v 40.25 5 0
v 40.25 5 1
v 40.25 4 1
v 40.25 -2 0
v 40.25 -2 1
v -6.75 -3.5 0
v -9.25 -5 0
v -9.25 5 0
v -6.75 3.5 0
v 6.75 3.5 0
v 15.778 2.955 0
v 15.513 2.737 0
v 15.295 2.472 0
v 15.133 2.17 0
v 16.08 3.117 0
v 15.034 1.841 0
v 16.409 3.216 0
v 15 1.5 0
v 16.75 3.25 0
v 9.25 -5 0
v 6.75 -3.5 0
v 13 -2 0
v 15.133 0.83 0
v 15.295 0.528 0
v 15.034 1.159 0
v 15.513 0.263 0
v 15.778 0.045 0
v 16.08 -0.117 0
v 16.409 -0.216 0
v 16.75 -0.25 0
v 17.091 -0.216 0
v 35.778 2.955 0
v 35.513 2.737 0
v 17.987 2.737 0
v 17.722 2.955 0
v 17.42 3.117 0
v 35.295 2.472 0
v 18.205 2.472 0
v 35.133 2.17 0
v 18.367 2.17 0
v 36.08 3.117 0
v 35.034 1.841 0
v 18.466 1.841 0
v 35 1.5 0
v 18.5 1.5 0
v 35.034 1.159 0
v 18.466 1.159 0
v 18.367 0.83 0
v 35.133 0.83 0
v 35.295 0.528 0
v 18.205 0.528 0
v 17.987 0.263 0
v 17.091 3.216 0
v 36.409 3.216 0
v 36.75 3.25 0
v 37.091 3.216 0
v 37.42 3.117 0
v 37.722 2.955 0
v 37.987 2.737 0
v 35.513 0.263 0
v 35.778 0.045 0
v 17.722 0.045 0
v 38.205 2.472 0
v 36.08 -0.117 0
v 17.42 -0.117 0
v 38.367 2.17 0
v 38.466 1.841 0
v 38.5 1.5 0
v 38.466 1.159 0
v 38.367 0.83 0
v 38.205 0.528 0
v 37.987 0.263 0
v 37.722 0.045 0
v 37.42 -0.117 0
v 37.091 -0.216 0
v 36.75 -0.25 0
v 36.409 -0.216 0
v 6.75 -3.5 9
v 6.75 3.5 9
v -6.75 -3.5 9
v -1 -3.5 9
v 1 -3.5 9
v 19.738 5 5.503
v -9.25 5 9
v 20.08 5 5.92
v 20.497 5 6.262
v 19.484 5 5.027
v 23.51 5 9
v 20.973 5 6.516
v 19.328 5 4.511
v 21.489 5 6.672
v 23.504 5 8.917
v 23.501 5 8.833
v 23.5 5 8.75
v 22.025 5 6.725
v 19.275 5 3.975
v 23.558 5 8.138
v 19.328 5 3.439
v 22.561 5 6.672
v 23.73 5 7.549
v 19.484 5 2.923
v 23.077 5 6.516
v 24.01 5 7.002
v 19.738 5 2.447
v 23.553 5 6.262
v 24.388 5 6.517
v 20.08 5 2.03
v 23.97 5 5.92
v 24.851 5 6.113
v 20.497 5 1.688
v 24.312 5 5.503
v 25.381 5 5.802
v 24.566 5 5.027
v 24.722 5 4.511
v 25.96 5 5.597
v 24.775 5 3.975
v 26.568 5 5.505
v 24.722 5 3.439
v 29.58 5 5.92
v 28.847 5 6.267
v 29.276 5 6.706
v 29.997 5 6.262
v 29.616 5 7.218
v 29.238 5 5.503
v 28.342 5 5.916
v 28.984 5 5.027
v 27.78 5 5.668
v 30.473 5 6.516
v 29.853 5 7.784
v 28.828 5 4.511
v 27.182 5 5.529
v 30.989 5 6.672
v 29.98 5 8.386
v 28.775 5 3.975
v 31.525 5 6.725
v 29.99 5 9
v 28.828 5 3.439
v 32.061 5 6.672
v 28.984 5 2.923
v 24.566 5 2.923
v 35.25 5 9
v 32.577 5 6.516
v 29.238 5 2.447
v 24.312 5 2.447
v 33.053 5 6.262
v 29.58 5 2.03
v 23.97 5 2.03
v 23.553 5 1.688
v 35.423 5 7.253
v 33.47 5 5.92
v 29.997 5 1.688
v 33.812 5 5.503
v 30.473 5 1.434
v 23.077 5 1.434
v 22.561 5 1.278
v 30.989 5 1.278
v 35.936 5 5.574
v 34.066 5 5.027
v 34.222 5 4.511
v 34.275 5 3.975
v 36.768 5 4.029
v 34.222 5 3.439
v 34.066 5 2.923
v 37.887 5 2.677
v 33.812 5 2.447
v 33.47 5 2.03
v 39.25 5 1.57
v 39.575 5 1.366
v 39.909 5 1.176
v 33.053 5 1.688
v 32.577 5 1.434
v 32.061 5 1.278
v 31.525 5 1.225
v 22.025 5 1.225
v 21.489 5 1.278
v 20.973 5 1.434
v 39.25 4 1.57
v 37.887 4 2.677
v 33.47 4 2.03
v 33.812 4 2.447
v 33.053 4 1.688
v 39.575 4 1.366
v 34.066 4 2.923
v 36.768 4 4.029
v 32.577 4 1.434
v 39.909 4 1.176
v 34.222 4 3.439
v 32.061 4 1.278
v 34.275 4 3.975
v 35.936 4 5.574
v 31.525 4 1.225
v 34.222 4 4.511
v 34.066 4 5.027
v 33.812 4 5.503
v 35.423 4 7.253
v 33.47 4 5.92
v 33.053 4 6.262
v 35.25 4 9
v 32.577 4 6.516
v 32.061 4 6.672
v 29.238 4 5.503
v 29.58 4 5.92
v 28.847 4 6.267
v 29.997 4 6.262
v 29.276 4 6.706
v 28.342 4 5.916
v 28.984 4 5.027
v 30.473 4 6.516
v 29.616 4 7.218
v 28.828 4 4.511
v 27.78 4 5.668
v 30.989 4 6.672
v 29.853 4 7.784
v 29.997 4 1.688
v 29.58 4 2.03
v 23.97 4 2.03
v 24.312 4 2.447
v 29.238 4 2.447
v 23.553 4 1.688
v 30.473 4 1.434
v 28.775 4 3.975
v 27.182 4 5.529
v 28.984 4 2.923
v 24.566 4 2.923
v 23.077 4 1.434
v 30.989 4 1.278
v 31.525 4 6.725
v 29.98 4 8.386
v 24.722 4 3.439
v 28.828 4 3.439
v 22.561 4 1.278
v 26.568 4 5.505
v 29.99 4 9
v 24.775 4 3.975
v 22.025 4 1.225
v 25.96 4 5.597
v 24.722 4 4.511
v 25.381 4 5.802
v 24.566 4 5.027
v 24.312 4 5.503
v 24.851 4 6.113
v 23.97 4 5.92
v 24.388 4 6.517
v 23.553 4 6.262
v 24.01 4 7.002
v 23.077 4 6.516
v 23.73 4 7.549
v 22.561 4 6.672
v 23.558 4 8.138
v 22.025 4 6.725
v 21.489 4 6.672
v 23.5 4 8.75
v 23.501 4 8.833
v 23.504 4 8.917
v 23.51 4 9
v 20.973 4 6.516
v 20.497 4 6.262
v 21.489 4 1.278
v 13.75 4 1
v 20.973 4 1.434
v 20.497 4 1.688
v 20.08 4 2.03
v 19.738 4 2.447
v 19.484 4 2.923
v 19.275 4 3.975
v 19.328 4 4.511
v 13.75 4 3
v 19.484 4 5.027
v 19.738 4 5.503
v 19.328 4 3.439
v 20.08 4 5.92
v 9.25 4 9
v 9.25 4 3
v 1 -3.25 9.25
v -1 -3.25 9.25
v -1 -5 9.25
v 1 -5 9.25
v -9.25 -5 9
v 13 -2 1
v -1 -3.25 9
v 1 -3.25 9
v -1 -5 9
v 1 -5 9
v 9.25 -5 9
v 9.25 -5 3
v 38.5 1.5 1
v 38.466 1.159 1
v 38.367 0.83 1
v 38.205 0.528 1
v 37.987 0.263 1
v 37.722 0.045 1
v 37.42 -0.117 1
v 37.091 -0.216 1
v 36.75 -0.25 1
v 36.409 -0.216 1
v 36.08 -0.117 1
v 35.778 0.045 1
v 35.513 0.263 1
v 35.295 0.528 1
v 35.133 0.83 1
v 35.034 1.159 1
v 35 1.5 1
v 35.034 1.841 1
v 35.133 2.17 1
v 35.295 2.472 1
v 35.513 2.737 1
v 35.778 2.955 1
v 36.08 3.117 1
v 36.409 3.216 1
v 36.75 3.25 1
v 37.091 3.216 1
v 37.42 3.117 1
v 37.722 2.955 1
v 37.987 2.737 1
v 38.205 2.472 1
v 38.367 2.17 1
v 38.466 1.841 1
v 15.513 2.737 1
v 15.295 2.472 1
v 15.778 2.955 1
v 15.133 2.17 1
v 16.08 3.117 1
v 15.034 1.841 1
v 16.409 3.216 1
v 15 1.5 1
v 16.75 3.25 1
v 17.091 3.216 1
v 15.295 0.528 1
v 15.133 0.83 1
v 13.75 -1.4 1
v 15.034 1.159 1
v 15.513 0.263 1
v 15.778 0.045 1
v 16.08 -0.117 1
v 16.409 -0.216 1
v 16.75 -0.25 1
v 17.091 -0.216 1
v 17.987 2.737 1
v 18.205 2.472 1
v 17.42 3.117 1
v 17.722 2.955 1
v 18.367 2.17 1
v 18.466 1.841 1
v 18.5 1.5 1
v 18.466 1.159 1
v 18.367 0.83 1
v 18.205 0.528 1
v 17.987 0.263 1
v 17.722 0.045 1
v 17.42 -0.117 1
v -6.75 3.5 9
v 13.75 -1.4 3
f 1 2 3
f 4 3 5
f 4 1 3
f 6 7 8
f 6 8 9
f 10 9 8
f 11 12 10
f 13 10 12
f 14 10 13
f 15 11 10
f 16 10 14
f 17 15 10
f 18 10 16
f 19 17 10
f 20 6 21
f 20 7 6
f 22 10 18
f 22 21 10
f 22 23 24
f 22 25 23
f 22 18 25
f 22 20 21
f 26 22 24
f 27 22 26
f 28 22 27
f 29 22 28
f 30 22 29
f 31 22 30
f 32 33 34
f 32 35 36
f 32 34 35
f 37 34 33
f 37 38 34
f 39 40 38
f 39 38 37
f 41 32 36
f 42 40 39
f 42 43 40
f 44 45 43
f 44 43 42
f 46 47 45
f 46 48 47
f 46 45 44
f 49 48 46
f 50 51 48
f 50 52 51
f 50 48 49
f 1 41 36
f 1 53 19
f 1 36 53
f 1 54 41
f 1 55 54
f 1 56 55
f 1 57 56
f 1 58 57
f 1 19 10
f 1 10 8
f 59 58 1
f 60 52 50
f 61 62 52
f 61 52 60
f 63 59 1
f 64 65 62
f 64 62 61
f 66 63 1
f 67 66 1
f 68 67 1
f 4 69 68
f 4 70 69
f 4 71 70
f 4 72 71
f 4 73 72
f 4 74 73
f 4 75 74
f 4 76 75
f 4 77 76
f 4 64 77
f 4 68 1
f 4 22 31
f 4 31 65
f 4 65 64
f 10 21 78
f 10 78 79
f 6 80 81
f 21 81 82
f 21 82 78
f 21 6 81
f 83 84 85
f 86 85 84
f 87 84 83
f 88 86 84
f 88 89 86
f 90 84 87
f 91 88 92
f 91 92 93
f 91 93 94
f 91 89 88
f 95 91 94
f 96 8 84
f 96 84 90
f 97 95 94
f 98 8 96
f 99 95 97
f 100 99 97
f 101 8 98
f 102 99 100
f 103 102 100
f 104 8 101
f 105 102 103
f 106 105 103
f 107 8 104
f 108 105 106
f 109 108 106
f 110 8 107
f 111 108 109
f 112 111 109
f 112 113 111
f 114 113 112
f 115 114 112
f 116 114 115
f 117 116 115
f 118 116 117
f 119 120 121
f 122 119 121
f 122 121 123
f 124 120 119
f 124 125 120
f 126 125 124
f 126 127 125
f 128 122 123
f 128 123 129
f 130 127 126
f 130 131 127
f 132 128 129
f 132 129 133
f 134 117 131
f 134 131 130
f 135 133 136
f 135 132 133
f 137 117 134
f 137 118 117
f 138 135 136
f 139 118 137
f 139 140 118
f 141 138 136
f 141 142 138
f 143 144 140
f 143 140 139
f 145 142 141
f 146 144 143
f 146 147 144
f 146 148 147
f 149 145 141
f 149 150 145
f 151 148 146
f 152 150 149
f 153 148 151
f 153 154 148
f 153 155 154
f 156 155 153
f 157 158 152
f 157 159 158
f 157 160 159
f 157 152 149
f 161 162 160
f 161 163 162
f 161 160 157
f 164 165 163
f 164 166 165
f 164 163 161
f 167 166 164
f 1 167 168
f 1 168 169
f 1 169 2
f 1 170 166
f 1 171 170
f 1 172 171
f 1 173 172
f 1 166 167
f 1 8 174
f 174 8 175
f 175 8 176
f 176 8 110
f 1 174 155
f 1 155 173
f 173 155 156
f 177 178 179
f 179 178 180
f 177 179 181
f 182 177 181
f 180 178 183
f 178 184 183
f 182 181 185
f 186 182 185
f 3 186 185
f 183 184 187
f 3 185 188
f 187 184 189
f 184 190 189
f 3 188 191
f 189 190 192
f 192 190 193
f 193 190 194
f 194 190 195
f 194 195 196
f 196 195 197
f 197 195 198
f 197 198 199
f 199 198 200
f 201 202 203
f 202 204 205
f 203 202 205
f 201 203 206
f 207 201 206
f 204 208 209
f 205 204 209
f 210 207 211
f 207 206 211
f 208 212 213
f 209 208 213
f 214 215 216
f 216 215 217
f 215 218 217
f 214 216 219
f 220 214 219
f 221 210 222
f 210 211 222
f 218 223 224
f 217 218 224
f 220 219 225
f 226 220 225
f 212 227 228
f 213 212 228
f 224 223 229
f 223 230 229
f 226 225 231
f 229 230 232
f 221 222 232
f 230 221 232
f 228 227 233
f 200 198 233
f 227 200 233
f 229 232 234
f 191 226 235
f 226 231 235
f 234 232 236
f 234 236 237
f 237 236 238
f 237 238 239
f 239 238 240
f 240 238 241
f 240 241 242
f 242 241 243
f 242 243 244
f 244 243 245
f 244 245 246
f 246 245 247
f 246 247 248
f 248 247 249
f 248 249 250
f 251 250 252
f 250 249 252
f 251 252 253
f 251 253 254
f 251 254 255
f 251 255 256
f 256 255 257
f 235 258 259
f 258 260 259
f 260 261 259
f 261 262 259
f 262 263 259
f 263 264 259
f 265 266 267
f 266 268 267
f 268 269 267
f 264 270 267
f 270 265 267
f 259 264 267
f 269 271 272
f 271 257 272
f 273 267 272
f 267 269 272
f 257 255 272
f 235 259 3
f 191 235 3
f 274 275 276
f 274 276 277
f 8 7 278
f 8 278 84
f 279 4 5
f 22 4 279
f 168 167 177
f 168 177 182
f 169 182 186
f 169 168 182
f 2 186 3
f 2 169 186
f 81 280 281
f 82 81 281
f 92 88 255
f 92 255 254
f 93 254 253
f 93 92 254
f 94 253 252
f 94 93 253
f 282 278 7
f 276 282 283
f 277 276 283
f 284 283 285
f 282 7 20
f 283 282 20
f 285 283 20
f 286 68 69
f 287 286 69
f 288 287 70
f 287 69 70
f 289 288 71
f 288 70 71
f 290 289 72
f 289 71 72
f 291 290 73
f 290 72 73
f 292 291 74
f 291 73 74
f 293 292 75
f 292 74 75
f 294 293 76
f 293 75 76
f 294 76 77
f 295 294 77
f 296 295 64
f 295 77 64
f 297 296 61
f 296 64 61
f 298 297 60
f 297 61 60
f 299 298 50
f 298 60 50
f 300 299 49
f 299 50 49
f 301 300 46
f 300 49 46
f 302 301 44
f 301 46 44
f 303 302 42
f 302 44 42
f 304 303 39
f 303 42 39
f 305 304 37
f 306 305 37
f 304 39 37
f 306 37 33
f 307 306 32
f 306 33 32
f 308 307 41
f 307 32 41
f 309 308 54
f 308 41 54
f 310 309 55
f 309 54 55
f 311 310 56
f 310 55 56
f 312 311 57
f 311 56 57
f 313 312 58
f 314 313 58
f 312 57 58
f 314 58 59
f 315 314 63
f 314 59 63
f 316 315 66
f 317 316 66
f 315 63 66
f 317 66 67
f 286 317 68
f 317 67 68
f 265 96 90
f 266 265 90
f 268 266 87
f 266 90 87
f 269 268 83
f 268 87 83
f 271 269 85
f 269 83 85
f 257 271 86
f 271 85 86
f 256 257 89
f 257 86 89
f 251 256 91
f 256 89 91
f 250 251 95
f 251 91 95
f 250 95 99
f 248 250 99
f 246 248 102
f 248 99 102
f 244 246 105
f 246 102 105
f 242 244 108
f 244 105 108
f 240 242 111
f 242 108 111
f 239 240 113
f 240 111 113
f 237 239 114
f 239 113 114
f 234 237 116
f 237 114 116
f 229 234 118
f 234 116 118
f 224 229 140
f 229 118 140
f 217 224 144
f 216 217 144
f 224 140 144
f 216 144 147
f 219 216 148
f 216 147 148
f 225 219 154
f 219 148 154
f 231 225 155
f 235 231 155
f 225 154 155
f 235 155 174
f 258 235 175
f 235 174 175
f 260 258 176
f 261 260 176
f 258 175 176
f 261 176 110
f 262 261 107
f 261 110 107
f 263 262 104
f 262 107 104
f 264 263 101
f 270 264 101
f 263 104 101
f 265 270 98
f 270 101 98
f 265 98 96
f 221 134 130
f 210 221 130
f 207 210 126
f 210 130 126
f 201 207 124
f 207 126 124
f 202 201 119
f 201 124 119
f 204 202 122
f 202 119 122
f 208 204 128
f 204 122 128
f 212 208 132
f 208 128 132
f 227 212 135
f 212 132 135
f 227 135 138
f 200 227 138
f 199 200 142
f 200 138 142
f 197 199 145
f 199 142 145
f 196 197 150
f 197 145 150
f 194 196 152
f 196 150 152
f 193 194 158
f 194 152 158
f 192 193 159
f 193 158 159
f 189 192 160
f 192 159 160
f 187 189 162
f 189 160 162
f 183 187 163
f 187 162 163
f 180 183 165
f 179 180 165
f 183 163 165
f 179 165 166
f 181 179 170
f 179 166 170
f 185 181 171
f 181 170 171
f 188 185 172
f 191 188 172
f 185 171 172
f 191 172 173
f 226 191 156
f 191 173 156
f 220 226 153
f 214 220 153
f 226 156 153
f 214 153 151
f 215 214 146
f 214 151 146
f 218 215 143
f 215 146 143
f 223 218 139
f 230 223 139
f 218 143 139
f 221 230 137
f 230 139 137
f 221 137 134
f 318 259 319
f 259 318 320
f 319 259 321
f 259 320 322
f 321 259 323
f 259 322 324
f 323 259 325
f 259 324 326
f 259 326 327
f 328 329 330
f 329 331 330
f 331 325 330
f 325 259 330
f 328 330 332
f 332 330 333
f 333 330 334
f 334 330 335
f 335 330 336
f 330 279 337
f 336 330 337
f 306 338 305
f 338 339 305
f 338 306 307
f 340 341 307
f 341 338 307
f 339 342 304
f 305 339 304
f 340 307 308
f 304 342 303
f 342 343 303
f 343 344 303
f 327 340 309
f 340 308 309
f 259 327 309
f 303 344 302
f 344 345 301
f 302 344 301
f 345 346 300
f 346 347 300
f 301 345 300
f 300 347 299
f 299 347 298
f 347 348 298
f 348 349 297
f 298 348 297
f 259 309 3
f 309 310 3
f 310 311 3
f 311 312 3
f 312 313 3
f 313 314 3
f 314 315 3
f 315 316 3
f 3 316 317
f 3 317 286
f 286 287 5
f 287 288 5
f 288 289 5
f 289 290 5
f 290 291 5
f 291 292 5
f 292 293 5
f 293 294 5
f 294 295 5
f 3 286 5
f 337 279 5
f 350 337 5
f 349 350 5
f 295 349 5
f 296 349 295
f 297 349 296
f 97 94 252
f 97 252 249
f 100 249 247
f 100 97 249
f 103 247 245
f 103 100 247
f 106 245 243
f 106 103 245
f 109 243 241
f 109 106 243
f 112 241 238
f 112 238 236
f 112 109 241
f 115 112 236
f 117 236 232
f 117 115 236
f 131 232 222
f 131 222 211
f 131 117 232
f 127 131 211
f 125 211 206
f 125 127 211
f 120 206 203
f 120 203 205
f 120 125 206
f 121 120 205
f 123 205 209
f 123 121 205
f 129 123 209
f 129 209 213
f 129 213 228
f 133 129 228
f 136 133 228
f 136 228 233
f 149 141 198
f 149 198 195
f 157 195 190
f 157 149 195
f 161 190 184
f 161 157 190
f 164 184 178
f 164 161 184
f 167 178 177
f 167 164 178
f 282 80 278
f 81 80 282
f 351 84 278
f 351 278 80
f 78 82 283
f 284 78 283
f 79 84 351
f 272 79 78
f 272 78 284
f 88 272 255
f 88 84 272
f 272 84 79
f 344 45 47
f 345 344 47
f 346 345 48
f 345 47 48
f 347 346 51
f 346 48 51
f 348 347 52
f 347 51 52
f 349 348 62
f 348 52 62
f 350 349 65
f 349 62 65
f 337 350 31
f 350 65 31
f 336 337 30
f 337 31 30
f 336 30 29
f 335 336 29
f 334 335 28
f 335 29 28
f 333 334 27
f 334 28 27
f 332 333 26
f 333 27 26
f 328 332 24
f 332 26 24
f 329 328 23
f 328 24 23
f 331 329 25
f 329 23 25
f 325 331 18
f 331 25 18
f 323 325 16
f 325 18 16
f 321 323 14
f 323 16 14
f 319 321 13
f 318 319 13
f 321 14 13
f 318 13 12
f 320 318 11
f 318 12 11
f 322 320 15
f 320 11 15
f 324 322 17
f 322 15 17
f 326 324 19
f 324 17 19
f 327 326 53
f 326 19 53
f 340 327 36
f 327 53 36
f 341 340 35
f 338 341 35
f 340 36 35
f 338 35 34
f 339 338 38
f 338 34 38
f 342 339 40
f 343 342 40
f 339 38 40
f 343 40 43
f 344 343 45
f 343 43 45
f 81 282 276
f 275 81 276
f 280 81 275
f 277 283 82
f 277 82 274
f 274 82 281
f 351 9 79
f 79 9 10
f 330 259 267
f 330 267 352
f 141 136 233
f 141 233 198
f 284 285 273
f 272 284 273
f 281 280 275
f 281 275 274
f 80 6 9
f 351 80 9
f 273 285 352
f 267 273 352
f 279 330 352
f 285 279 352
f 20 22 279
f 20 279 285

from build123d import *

# Parameters (mm, degrees)
F0_W     = 18.5
F0_H     = 10
F0_W_2   = 13.5
F0_H_2   = 7
F1_DEPTH = 9
F3_DEPTH = 3
F2_W     = 25
F2_H     = 1
F2_H_2   = 5
F2_R     = 1.75
F4_DEPTH = 1
F5_R     = 2.75
F6_DEPTH = 1
F7_W     = 2
F7_H     = 1.75
F8_DEPTH = 0.25


with BuildPart() as f1:
    # F0 (on Top) → F1 (new body)
    with BuildSketch(Plane.XY):
        Rectangle(F0_W, F0_H)
        Rectangle(F0_W_2, F0_H_2, mode=Mode.SUBTRACT)
    extrude(amount=F1_DEPTH)

    # F2 (on face) → F3 (join)
    with BuildSketch(Plane(origin=(0, 0, 0), x_dir=(1, 0, 0), z_dir=(0, 0, -1))):
        Polygon((9.25, -5), (13.75, -5), (13.75, 1.4), (13, 2), (9.25, 5), align=None)
    extrude(amount=-F3_DEPTH)

    # F2 (on face) → F4 (join)
    with BuildSketch(Plane(origin=(0, 0, 0), x_dir=(1, 0, 0), z_dir=(0, 0, -1))):
        Polygon((13.75, -5), (14.25, -5), (14.25, -4), (14.25, 1), (13.75, 1.4), align=None)
        Polygon((39.25, -4), (39.25, -5), (40.25, -5), (40.25, 2), (13, 2), (13.75, 1.4), (14.25, 1), (39.25, 1), align=None)
        with Locations((26.75, -4.5)):
            Rectangle(F2_W, F2_H)
        with Locations((26.75, -1.5)):
            Rectangle(F2_W, F2_H_2)
        with Locations((16.75, -1.5)):
            Circle(F2_R, mode=Mode.SUBTRACT)
        with Locations((36.75, -1.5)):
            Circle(F2_R, mode=Mode.SUBTRACT)
    extrude(amount=-F4_DEPTH)

    # F5 (on face) → F6 (join)
    with BuildSketch(Plane(origin=(0, 5, 0), x_dir=(-1, 0, 0), z_dir=(0, 1, 0))):
        Polygon((-13.75, 1), (-14.25, 1), (-39.25, 1), (-40.25, 1), (-40.25, 0), (9.25, 0), (9.25, 9), (-9.25, 9), (-9.25, 3), (-9.25, 1), align=None)
        with BuildLine():
            Line((-39.25, 1), (-14.25, 1))
            Line((-14.25, 1), (-14.25, 9))
            Line((-14.25, 9), (-23.5096296508, 9))
            ThreePointArc((-23.5096296508, 9), (-23.502408305, 8.8750926958), (-23.5, 8.75))
            ThreePointArc((-23.5, 8.75), (-26.8750926958, 5.502408305), (-29.9903703492, 9))
            Line((-29.9903703492, 9), (-35.25, 9))
            ThreePointArc((-35.25, 9), (-36.3135467206, 4.7809953781), (-39.25, 1.5703297516))
            Line((-39.25, 1.5703297516), (-39.25, 1))
        make_face()
        with Locations((-31.525, 3.975)):
            Circle(F5_R, mode=Mode.SUBTRACT)
        with Locations((-22.025, 3.975)):
            Circle(F5_R, mode=Mode.SUBTRACT)
        Polygon((-14.25, 9), (-14.25, 1), (-13.75, 1), (-13.75, 3), (-9.25, 3), (-9.25, 9), align=None)
        with BuildLine():
            Line((-40.25, 1), (-39.25, 1))
            Line((-39.25, 1), (-39.25, 1.5703297516))
            ThreePointArc((-39.25, 1.5703297516), (-39.7407688872, 1.2689793045), (-40.25, 1))
        make_face()
    extrude(amount=-F6_DEPTH)

    # F7 (on face) → F8 (join)
    with BuildSketch(Plane.XY.offset(9)):
        with Locations((0, -4.125)):
            Rectangle(F7_W, F7_H)
    extrude(amount=F8_DEPTH)


solid = f1.part
